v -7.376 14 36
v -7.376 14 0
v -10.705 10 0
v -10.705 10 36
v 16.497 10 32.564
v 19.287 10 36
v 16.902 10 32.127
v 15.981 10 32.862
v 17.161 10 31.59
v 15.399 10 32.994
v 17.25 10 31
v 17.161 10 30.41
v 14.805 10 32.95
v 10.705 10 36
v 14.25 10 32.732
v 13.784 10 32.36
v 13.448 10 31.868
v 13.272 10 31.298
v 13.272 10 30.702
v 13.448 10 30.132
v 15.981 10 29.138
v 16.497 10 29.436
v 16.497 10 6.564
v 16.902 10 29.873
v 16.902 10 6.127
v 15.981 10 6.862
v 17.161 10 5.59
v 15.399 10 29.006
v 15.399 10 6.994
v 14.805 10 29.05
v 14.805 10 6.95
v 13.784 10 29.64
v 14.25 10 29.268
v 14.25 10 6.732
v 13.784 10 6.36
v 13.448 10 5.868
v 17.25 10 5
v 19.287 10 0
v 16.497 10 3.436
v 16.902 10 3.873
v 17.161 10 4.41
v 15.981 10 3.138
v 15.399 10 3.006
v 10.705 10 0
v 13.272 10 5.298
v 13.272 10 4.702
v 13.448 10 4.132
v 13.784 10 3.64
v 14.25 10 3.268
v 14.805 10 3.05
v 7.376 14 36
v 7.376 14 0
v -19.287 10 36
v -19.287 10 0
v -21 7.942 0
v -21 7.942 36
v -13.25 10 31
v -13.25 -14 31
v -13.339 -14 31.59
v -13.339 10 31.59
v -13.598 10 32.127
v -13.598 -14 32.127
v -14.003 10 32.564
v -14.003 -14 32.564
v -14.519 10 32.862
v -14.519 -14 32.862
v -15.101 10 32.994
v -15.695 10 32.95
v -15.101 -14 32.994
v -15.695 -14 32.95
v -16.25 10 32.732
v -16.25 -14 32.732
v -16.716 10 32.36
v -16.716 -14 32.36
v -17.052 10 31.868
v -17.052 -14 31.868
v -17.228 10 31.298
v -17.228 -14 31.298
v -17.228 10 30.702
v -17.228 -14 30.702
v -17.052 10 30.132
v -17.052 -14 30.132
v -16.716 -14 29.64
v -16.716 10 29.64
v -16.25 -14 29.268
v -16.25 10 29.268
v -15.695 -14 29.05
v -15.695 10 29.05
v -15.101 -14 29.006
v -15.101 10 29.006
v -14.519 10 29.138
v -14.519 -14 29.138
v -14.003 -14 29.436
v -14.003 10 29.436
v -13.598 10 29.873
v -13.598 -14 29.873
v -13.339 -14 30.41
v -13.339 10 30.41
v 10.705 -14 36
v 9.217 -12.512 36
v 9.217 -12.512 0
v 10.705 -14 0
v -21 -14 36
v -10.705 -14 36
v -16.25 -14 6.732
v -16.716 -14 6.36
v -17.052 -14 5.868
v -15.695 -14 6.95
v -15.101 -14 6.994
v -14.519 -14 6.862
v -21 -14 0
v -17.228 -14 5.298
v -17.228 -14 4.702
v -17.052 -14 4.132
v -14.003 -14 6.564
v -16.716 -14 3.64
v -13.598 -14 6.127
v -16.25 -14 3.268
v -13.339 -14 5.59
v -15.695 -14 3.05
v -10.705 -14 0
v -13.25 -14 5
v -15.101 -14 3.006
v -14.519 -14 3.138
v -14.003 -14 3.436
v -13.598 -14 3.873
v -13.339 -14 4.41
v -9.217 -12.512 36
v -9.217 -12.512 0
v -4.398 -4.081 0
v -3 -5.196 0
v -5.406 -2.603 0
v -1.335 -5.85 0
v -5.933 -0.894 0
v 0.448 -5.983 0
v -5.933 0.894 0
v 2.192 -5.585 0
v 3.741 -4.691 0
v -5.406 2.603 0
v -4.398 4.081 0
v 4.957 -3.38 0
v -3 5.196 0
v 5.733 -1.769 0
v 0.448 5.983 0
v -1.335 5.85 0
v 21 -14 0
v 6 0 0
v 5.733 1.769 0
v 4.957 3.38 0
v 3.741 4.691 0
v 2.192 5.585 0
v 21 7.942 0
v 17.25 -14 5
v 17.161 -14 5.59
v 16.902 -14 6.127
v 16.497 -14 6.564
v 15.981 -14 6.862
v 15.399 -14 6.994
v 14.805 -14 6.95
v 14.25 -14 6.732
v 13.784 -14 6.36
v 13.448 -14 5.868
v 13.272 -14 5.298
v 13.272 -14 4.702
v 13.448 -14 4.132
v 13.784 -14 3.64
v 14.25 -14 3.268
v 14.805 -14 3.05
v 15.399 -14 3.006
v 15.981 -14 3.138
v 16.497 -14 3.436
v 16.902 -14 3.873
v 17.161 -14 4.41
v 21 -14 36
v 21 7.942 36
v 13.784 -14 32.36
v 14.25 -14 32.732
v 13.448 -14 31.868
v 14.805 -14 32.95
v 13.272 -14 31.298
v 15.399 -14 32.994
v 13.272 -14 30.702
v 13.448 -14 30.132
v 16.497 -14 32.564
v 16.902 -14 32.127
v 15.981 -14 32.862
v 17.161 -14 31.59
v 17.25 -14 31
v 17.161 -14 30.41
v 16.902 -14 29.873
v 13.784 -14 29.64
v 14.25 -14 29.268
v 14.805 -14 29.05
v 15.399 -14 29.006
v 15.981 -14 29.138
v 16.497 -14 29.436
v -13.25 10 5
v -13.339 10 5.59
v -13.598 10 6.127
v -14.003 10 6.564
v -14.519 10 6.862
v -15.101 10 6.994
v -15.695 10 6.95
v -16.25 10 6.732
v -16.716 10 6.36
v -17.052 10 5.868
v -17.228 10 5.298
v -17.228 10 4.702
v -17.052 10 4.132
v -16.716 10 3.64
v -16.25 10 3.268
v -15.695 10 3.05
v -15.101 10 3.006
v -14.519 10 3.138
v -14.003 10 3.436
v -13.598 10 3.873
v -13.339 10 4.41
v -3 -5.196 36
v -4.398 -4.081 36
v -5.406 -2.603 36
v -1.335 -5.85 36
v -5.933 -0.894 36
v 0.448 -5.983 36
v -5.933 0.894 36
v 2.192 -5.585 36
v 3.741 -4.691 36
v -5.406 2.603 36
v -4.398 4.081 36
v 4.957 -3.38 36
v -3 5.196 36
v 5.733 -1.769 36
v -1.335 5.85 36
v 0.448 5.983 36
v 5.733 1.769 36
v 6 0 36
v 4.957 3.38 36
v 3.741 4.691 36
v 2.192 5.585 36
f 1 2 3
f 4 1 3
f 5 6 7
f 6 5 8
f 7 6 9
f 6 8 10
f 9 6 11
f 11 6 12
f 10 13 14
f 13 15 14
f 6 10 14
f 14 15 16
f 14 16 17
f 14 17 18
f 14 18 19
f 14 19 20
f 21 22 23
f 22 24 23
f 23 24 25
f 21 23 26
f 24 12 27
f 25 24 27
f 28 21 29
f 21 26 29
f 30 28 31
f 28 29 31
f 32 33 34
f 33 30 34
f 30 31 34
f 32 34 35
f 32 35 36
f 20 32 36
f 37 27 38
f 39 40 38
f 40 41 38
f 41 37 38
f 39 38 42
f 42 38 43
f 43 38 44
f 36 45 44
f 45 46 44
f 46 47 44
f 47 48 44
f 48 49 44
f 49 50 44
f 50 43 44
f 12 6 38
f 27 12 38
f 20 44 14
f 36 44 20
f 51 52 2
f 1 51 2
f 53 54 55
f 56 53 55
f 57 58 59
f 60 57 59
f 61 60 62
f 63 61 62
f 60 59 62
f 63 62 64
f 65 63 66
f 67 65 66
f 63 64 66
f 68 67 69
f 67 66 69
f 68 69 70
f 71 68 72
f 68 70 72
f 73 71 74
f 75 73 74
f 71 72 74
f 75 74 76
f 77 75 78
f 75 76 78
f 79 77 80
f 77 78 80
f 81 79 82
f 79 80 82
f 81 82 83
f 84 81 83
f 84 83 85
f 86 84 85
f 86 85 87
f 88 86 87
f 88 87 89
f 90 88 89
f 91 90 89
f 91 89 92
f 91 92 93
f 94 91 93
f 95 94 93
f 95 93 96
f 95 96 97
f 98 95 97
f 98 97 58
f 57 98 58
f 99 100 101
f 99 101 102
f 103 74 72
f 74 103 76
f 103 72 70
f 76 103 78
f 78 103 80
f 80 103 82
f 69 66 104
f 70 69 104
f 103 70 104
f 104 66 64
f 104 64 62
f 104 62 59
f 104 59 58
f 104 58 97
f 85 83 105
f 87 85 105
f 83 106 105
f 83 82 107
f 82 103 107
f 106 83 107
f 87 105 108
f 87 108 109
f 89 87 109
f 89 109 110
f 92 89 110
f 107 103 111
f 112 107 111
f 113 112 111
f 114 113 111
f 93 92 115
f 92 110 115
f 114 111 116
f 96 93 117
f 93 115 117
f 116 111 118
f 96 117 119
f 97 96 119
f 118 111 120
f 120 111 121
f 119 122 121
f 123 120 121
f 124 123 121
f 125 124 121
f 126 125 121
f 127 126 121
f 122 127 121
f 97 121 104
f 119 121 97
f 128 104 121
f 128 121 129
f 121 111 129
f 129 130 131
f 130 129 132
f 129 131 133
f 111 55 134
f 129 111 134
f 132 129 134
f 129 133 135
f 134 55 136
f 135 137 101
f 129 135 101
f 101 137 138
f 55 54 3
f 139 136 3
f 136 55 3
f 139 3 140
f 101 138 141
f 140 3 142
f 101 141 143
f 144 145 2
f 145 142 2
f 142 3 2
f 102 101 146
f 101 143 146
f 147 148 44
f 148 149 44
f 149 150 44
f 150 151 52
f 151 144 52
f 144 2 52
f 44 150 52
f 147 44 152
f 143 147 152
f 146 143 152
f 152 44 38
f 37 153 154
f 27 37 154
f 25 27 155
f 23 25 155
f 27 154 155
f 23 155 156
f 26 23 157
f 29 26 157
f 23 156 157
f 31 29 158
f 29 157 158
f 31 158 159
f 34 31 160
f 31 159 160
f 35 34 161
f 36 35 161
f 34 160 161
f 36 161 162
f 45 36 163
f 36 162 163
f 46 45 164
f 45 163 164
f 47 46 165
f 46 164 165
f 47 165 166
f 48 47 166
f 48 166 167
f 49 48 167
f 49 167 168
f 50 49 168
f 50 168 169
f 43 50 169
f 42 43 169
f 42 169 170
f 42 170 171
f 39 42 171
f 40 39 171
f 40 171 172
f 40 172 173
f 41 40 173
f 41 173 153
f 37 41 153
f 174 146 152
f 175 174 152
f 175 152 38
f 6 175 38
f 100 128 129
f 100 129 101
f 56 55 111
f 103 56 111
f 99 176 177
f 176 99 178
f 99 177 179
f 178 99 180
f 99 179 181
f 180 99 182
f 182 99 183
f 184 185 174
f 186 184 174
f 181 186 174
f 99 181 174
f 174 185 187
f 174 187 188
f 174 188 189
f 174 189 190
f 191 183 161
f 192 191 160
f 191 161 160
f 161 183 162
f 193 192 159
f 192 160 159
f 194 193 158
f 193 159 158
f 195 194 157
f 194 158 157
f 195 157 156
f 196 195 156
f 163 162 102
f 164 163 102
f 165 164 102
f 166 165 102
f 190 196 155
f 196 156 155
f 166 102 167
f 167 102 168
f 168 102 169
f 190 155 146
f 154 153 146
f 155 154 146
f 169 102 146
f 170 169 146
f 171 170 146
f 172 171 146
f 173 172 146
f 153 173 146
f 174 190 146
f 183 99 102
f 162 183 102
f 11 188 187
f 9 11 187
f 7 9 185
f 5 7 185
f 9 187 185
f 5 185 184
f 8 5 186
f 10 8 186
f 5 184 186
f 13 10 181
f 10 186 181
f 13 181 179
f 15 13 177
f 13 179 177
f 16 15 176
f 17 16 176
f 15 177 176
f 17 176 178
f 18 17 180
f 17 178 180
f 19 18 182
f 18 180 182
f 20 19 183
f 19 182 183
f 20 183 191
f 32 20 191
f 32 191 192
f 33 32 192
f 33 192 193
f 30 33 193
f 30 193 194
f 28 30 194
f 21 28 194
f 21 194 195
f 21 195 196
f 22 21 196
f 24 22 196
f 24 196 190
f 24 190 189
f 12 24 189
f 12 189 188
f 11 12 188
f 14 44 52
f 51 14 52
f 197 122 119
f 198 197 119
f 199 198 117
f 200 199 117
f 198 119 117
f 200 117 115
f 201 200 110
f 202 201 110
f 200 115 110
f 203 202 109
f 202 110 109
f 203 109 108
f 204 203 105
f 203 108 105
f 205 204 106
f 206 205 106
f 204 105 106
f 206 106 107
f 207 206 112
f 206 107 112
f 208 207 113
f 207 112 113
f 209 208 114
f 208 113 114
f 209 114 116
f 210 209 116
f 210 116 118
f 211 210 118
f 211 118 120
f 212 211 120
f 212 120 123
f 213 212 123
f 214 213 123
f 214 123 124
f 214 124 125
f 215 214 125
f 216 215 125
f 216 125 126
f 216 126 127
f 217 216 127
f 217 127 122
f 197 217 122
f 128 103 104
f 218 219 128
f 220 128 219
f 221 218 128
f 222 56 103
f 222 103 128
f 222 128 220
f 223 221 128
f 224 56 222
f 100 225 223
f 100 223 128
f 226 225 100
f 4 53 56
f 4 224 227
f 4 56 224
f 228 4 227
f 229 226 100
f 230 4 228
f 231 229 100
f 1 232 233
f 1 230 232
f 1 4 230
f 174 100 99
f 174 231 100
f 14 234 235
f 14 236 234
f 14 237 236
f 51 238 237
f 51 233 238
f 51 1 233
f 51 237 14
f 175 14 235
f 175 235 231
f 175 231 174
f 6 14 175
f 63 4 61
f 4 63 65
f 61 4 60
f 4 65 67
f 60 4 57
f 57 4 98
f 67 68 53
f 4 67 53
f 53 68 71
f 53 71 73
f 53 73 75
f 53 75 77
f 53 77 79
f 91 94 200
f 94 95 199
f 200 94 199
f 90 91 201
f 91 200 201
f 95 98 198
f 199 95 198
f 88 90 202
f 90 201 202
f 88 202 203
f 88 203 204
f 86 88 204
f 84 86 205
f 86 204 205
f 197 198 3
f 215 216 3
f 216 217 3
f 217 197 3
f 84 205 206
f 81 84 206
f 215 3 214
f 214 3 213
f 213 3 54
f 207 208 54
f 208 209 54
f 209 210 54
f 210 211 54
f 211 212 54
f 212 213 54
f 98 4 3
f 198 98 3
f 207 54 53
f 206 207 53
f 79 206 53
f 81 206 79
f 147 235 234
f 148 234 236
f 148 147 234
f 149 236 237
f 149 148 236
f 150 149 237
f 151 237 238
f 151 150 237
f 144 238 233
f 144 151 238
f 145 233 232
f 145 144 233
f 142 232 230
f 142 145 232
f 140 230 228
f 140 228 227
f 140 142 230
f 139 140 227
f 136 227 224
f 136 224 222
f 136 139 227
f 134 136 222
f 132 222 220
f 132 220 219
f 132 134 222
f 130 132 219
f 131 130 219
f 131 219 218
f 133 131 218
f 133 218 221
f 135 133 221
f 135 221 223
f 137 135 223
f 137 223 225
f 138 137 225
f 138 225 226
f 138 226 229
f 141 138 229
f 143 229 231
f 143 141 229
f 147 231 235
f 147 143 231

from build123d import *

# Parameters (mm, degrees)
SKETCH1_R           = 6
BOSS_EXTRUDE1_DEPTH = 36
CUT_EXTRUDE1_REACH  = 30
SKETCH2_R           = 2


with BuildPart() as part:
    # Sketch1 → Boss-Extrude1 (new body)
    with BuildSketch(Plane.XY):
        Polygon((-7.376347734, 14), (-10.704853009, 10), (-19.287228785, 10), (-21, 7.941693254), (-21, -14), (-12.193167268, -14), (-10.704853009, -14), (-9.216538749, -12.511685741), (9.216538749, -12.511685741), (10.704853009, -14), (12.193167268, -14), (21, -14), (21, 7.941693254), (19.287228785, 10), (10.704853009, 10), (7.376347734, 14), align=None)
        Circle(SKETCH1_R, mode=Mode.SUBTRACT)
    extrude(amount=BOSS_EXTRUDE1_DEPTH)

    # Sketch2 → Cut-Extrude1 (cut, up to next)
    with BuildSketch(Plane.XZ.offset(14), mode=Mode.PRIVATE) as cut_extrude1_sk1:
        with Locations((-15.25, 31)):
            Circle(SKETCH2_R)
    cut_extrude1_tool1 = extrude(cut_extrude1_sk1.sketch, amount=-CUT_EXTRUDE1_REACH, mode=Mode.PRIVATE) & part.part
    add(cut_extrude1_tool1.solids().sort_by_distance((-15.25, -14, 31))[0], mode=Mode.SUBTRACT)
    # Sketch2 → Cut-Extrude1 (cut, up to next)
    with BuildSketch(Plane.XZ.offset(14), mode=Mode.PRIVATE) as cut_extrude1_sk2:
        with Locations((15.25, 31)):
            Circle(SKETCH2_R)
    cut_extrude1_tool2 = extrude(cut_extrude1_sk2.sketch, amount=-CUT_EXTRUDE1_REACH, mode=Mode.PRIVATE) & part.part
    add(cut_extrude1_tool2.solids().sort_by_distance((15.25, -14, 31))[0], mode=Mode.SUBTRACT)
    # Sketch2 → Cut-Extrude1 (cut, up to next)
    with BuildSketch(Plane.XZ.offset(14), mode=Mode.PRIVATE) as cut_extrude1_sk3:
        with Locations((15.25, 5)):
            Circle(SKETCH2_R)
    cut_extrude1_tool3 = extrude(cut_extrude1_sk3.sketch, amount=-CUT_EXTRUDE1_REACH, mode=Mode.PRIVATE) & part.part
    add(cut_extrude1_tool3.solids().sort_by_distance((15.25, -14, 5))[0], mode=Mode.SUBTRACT)
    # Sketch2 → Cut-Extrude1 (cut, up to next)
    with BuildSketch(Plane.XZ.offset(14), mode=Mode.PRIVATE) as cut_extrude1_sk4:
        with Locations((-15.25, 5)):
            Circle(SKETCH2_R)
    cut_extrude1_tool4 = extrude(cut_extrude1_sk4.sketch, amount=-CUT_EXTRUDE1_REACH, mode=Mode.PRIVATE) & part.part
    add(cut_extrude1_tool4.solids().sort_by_distance((-15.25, -14, 5))[0], mode=Mode.SUBTRACT)


solid = part.part
